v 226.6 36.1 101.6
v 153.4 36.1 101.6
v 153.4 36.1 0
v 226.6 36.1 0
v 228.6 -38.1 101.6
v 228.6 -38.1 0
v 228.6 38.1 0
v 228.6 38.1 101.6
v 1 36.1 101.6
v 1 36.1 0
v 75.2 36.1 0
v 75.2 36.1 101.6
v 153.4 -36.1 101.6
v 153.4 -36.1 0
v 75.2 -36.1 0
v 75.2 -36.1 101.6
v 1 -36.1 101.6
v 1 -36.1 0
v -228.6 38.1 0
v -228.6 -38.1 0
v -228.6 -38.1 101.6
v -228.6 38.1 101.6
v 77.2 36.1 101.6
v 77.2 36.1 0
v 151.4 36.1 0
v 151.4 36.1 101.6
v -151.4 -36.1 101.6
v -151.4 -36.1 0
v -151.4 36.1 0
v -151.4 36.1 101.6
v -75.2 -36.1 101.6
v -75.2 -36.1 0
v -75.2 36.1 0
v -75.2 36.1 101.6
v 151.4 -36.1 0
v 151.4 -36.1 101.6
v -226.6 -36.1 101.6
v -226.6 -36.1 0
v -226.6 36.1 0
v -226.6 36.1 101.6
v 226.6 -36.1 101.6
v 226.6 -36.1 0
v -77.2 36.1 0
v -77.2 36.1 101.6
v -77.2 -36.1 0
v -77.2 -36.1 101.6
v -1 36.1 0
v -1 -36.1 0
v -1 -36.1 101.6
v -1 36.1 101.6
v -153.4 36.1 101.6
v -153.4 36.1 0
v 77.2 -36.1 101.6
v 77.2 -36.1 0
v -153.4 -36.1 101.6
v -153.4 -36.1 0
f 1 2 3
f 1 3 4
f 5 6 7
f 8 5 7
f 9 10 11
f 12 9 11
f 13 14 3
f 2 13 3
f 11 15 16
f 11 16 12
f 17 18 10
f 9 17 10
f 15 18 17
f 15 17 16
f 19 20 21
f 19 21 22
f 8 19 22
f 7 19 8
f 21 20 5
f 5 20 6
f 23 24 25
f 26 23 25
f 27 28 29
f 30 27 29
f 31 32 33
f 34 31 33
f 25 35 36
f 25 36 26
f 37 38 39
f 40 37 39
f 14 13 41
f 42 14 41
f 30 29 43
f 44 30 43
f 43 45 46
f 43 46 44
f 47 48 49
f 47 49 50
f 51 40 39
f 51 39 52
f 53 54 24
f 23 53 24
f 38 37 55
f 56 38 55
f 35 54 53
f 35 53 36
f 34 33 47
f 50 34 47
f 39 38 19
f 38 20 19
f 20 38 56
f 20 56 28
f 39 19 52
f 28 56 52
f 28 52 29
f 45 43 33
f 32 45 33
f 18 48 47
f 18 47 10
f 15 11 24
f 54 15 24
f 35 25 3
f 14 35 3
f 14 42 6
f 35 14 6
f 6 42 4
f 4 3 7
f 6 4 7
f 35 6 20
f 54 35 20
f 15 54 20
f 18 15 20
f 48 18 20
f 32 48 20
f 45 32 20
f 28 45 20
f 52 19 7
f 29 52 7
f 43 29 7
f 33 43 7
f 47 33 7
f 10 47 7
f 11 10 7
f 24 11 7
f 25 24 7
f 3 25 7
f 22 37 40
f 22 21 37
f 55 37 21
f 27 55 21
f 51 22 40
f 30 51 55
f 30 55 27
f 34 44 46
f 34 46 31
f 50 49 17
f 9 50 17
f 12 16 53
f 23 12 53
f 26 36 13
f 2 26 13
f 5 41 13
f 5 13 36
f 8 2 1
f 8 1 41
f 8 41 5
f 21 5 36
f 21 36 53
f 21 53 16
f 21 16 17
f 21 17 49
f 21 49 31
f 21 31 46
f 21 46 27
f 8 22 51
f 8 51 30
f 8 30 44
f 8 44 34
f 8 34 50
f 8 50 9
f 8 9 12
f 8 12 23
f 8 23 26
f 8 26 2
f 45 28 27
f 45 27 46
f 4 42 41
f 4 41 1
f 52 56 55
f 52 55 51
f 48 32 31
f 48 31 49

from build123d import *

# Parameters (mm, degrees)
SKETCH_1_W          = 457.2
SKETCH_1_H          = 76.2
EXTRUDE_1_DEPTH     = 101.6
SKETCH_1_3_W        = 73.2
SKETCH_1_3_H        = 72.2
SKETCH_1_3_W_2      = 74.2
CUT_EXTRUDE_1_DEPTH = 102.6


with BuildPart() as part:
    # Эскиз1 → Бобышка-Вытянуть1 (new body)
    with BuildSketch(Plane.XY):
        Rectangle(SKETCH_1_W, SKETCH_1_H)
    extrude(amount=EXTRUDE_1_DEPTH)

    # Эскиз1<3> → Вырез-Вытянуть1 (cut, through all)
    with BuildSketch(Plane.XY):
        with Locations((-190, 0)):
            Rectangle(SKETCH_1_3_W, SKETCH_1_3_H)
        with Locations((-114.3, 0)):
            Rectangle(SKETCH_1_3_W_2, SKETCH_1_3_H)
        with Locations((-38.1, 0)):
            Rectangle(SKETCH_1_3_W_2, SKETCH_1_3_H)
        with Locations((38.1, 0)):
            Rectangle(SKETCH_1_3_W_2, SKETCH_1_3_H)
        with Locations((114.3, 0)):
            Rectangle(SKETCH_1_3_W_2, SKETCH_1_3_H)
        with Locations((190, 0)):
            Rectangle(SKETCH_1_3_W, SKETCH_1_3_H)
    extrude(amount=CUT_EXTRUDE_1_DEPTH, mode=Mode.SUBTRACT)


solid = part.part
